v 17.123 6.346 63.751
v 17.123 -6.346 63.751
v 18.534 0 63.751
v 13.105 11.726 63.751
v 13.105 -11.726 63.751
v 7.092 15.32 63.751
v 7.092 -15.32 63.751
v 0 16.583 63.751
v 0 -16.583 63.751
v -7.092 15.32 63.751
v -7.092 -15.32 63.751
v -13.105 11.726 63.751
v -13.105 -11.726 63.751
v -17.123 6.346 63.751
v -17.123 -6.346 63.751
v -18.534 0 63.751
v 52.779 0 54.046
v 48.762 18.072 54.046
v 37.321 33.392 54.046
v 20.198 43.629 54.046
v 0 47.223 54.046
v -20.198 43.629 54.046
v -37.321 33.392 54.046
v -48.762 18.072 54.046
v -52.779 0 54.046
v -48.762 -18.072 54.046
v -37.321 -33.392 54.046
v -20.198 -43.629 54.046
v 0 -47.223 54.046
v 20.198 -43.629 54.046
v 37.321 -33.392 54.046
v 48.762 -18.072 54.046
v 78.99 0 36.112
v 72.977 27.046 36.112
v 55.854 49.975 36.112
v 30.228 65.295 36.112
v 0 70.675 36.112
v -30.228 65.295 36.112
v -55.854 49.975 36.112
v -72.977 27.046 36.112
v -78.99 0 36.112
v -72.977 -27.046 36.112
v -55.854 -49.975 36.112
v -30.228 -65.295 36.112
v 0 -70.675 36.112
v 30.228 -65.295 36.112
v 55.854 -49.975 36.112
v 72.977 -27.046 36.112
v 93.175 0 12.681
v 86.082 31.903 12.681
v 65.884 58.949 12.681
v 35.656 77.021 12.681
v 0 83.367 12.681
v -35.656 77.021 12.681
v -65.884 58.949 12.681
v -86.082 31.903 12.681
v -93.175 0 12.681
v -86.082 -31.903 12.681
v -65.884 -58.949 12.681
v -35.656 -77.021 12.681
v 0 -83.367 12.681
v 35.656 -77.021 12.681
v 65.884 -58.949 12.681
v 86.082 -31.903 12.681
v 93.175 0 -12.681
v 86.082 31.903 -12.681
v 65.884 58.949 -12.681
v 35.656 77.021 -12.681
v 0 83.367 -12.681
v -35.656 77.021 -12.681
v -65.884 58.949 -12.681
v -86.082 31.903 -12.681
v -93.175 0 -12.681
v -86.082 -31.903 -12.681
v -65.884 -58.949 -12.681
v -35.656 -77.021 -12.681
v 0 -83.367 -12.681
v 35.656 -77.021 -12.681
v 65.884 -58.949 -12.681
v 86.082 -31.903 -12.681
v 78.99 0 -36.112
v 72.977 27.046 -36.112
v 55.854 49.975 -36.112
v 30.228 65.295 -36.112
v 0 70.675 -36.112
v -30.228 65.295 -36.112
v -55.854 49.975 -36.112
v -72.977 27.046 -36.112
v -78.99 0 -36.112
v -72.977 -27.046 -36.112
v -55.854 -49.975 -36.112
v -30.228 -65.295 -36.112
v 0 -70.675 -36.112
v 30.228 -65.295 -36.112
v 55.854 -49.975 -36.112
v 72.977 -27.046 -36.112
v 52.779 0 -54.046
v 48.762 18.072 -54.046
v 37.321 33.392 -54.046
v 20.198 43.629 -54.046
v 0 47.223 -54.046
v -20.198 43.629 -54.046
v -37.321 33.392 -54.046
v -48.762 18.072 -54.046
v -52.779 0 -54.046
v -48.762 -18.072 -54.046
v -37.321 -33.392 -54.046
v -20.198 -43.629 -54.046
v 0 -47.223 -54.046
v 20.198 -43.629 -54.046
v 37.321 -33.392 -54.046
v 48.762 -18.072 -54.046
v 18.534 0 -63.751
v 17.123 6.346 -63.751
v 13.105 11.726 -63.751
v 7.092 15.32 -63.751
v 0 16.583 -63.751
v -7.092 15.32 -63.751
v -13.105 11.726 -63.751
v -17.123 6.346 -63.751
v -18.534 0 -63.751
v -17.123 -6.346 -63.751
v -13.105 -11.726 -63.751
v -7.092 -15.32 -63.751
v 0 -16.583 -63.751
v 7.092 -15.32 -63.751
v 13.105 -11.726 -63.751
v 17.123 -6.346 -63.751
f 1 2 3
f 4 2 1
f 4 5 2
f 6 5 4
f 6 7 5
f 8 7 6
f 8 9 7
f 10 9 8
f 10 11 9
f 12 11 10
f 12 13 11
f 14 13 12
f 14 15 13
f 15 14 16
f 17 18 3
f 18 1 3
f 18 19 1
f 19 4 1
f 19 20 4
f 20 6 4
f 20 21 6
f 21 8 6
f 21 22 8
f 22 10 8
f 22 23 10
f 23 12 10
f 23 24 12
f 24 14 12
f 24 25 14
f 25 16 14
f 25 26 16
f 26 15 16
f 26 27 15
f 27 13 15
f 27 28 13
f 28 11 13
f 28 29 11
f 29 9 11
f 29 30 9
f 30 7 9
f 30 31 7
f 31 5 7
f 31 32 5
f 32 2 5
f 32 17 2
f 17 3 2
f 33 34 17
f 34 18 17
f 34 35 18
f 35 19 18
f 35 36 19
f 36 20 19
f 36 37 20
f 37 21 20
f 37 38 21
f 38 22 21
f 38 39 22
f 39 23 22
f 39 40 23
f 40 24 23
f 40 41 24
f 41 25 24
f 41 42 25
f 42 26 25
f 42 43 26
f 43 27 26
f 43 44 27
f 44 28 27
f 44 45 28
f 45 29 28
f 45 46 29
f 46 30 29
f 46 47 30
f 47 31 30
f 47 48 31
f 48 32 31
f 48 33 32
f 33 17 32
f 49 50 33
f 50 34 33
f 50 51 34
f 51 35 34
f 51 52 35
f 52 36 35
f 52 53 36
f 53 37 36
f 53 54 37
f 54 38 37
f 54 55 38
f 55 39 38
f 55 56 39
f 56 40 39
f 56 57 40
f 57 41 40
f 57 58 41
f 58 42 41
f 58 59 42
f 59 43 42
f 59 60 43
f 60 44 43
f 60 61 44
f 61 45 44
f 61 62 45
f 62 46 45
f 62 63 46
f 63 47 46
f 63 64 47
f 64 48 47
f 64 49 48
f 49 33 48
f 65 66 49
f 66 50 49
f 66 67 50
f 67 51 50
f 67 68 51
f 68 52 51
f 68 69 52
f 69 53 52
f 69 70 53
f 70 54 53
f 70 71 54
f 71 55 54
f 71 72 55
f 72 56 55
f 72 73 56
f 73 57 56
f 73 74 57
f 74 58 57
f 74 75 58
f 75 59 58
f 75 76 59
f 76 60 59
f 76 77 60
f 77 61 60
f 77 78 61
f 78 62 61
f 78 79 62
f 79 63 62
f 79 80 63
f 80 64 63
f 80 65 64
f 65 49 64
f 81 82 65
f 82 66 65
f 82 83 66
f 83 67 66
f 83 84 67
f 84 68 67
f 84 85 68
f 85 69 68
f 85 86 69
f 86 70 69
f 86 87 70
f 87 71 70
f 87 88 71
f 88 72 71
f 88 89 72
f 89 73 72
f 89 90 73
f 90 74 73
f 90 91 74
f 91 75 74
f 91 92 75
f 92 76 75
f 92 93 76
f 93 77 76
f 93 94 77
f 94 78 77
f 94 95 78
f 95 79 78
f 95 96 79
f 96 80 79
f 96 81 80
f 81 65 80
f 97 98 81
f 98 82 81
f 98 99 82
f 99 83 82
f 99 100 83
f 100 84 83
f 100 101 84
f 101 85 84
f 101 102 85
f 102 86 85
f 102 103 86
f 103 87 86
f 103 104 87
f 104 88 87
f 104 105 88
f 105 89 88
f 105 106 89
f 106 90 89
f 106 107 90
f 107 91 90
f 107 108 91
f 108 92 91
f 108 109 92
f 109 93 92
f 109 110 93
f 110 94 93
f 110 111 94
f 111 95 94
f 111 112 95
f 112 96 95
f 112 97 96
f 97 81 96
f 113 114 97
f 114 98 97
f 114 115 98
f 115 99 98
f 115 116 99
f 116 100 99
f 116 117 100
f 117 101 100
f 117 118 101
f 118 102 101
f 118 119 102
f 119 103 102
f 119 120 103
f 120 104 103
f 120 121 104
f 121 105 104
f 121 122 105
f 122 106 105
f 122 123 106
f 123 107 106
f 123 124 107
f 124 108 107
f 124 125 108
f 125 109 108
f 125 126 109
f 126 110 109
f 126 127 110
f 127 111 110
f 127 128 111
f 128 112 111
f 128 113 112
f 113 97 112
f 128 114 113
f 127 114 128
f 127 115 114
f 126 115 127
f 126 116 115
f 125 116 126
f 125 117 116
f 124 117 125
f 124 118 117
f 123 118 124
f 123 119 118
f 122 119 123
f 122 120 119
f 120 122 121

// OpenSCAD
// Generated by SolidPython 1.0.1 on 2020-07-29 00:46:54


scale(v = [19, 17, 13]) {
	sphere(r = 5);
}
/***********************************************
*********      SolidPython code:      **********
************************************************
 
# import packages: SolidPython
from solid import *
from solid.utils import *
from itertools import chain, combinations, permutations


class Resize:

    def __init__(self, scad_file):
        self.scad_file = scad_file
        #self.scad_file = import_scad(scad_file)
        # cone/cylinder param:
        self.r1 = 0
        self.r2 = 0
        self.h = 0
        # rectangular prism param:
        self.w = 0
        self.l = 0
        # ellipse param:
        self.r = 0

    # import OpenScad code (file name corresponds to shape)


    # classify shape + parameters
    def assign(self, param1, param2, param3):
        if self.scad_file == 'cone.scad':
            self.r1 = param1
            self.r2 = param2
            self.h = param3
        elif self.scad_file == 'cylinder.scad':
            self.r1 = param1
            self.r2 = param2
            self.h = param3
        elif self.scad_file == 'rectangularPrism.scad':
            self.h = param1
            self.l = param2
            self.w = param3
        else:
            self.r = param1
            self.h = param2

    # resize parameters
    def iterate(self):
        x = range(3, 20, 2)
        i = 1
        if self.scad_file == 'cone.scad':
            tempList = list(permutations(x, 2))
            for temp in tempList:
                param1 = temp[0]
                param2 = temp[1]
                filepath = 'produced_scad_files/' + 'cone' + str(param1) + '_' + str(param2) + '_' + '.scad'
                scad_render_to_file(cylinder(h=param1, r1=param2, r2=0), filepath)

        elif self.scad_file == 'cylinder.scad':
            tempList = list(permutations(x, 3))
            for temp in tempList:
                param1 = temp[0]
                param2 = temp[1]
                filepath = 'produced_scad_files/' + 'cylinder' + str(param1) + '_' + str(param2) + '_' + '.scad'
                scad_render_to_file(cylinder(h=param1, r1=param2, r2=param2), filepath)

        elif self.scad_file == 'rectangularPrism.scad':
            tempList = list(permutations(x, 3))
            for temp in tempList:
                param1 = temp[0]
                param2 = temp[1]
                param3 = temp[2]
                filepath = 'produced_scad_files/' + 'rectangularPrism' + str(param1) + '_' + str(param2) + '_' + str(
                    param3) + '.scad'
                scad_render_to_file(cube(size=(param1, param2, param3)), filepath)

        elif self.scad_file == 'ellipse.scad':
            tempList = list(permutations(x, 4))
            for temp in tempList:
                param1 = temp[0]
                param2 = temp[1]
                param3 = temp[2]
                param4 = temp[3]
                filepath = 'produced_scad_files/' + 'ellipse' + str(param1) + '_' + str(param2) + '_' + str(param3) + '_' + str(param4) + '.scad'
                scad_render_to_file(scale([param1, param2, param3])(sphere(r=param4)), filepath)

    def render_to_scadfile(self):
        scad_render_to_file(scad, 'example.scad') 
 
************************************************/
